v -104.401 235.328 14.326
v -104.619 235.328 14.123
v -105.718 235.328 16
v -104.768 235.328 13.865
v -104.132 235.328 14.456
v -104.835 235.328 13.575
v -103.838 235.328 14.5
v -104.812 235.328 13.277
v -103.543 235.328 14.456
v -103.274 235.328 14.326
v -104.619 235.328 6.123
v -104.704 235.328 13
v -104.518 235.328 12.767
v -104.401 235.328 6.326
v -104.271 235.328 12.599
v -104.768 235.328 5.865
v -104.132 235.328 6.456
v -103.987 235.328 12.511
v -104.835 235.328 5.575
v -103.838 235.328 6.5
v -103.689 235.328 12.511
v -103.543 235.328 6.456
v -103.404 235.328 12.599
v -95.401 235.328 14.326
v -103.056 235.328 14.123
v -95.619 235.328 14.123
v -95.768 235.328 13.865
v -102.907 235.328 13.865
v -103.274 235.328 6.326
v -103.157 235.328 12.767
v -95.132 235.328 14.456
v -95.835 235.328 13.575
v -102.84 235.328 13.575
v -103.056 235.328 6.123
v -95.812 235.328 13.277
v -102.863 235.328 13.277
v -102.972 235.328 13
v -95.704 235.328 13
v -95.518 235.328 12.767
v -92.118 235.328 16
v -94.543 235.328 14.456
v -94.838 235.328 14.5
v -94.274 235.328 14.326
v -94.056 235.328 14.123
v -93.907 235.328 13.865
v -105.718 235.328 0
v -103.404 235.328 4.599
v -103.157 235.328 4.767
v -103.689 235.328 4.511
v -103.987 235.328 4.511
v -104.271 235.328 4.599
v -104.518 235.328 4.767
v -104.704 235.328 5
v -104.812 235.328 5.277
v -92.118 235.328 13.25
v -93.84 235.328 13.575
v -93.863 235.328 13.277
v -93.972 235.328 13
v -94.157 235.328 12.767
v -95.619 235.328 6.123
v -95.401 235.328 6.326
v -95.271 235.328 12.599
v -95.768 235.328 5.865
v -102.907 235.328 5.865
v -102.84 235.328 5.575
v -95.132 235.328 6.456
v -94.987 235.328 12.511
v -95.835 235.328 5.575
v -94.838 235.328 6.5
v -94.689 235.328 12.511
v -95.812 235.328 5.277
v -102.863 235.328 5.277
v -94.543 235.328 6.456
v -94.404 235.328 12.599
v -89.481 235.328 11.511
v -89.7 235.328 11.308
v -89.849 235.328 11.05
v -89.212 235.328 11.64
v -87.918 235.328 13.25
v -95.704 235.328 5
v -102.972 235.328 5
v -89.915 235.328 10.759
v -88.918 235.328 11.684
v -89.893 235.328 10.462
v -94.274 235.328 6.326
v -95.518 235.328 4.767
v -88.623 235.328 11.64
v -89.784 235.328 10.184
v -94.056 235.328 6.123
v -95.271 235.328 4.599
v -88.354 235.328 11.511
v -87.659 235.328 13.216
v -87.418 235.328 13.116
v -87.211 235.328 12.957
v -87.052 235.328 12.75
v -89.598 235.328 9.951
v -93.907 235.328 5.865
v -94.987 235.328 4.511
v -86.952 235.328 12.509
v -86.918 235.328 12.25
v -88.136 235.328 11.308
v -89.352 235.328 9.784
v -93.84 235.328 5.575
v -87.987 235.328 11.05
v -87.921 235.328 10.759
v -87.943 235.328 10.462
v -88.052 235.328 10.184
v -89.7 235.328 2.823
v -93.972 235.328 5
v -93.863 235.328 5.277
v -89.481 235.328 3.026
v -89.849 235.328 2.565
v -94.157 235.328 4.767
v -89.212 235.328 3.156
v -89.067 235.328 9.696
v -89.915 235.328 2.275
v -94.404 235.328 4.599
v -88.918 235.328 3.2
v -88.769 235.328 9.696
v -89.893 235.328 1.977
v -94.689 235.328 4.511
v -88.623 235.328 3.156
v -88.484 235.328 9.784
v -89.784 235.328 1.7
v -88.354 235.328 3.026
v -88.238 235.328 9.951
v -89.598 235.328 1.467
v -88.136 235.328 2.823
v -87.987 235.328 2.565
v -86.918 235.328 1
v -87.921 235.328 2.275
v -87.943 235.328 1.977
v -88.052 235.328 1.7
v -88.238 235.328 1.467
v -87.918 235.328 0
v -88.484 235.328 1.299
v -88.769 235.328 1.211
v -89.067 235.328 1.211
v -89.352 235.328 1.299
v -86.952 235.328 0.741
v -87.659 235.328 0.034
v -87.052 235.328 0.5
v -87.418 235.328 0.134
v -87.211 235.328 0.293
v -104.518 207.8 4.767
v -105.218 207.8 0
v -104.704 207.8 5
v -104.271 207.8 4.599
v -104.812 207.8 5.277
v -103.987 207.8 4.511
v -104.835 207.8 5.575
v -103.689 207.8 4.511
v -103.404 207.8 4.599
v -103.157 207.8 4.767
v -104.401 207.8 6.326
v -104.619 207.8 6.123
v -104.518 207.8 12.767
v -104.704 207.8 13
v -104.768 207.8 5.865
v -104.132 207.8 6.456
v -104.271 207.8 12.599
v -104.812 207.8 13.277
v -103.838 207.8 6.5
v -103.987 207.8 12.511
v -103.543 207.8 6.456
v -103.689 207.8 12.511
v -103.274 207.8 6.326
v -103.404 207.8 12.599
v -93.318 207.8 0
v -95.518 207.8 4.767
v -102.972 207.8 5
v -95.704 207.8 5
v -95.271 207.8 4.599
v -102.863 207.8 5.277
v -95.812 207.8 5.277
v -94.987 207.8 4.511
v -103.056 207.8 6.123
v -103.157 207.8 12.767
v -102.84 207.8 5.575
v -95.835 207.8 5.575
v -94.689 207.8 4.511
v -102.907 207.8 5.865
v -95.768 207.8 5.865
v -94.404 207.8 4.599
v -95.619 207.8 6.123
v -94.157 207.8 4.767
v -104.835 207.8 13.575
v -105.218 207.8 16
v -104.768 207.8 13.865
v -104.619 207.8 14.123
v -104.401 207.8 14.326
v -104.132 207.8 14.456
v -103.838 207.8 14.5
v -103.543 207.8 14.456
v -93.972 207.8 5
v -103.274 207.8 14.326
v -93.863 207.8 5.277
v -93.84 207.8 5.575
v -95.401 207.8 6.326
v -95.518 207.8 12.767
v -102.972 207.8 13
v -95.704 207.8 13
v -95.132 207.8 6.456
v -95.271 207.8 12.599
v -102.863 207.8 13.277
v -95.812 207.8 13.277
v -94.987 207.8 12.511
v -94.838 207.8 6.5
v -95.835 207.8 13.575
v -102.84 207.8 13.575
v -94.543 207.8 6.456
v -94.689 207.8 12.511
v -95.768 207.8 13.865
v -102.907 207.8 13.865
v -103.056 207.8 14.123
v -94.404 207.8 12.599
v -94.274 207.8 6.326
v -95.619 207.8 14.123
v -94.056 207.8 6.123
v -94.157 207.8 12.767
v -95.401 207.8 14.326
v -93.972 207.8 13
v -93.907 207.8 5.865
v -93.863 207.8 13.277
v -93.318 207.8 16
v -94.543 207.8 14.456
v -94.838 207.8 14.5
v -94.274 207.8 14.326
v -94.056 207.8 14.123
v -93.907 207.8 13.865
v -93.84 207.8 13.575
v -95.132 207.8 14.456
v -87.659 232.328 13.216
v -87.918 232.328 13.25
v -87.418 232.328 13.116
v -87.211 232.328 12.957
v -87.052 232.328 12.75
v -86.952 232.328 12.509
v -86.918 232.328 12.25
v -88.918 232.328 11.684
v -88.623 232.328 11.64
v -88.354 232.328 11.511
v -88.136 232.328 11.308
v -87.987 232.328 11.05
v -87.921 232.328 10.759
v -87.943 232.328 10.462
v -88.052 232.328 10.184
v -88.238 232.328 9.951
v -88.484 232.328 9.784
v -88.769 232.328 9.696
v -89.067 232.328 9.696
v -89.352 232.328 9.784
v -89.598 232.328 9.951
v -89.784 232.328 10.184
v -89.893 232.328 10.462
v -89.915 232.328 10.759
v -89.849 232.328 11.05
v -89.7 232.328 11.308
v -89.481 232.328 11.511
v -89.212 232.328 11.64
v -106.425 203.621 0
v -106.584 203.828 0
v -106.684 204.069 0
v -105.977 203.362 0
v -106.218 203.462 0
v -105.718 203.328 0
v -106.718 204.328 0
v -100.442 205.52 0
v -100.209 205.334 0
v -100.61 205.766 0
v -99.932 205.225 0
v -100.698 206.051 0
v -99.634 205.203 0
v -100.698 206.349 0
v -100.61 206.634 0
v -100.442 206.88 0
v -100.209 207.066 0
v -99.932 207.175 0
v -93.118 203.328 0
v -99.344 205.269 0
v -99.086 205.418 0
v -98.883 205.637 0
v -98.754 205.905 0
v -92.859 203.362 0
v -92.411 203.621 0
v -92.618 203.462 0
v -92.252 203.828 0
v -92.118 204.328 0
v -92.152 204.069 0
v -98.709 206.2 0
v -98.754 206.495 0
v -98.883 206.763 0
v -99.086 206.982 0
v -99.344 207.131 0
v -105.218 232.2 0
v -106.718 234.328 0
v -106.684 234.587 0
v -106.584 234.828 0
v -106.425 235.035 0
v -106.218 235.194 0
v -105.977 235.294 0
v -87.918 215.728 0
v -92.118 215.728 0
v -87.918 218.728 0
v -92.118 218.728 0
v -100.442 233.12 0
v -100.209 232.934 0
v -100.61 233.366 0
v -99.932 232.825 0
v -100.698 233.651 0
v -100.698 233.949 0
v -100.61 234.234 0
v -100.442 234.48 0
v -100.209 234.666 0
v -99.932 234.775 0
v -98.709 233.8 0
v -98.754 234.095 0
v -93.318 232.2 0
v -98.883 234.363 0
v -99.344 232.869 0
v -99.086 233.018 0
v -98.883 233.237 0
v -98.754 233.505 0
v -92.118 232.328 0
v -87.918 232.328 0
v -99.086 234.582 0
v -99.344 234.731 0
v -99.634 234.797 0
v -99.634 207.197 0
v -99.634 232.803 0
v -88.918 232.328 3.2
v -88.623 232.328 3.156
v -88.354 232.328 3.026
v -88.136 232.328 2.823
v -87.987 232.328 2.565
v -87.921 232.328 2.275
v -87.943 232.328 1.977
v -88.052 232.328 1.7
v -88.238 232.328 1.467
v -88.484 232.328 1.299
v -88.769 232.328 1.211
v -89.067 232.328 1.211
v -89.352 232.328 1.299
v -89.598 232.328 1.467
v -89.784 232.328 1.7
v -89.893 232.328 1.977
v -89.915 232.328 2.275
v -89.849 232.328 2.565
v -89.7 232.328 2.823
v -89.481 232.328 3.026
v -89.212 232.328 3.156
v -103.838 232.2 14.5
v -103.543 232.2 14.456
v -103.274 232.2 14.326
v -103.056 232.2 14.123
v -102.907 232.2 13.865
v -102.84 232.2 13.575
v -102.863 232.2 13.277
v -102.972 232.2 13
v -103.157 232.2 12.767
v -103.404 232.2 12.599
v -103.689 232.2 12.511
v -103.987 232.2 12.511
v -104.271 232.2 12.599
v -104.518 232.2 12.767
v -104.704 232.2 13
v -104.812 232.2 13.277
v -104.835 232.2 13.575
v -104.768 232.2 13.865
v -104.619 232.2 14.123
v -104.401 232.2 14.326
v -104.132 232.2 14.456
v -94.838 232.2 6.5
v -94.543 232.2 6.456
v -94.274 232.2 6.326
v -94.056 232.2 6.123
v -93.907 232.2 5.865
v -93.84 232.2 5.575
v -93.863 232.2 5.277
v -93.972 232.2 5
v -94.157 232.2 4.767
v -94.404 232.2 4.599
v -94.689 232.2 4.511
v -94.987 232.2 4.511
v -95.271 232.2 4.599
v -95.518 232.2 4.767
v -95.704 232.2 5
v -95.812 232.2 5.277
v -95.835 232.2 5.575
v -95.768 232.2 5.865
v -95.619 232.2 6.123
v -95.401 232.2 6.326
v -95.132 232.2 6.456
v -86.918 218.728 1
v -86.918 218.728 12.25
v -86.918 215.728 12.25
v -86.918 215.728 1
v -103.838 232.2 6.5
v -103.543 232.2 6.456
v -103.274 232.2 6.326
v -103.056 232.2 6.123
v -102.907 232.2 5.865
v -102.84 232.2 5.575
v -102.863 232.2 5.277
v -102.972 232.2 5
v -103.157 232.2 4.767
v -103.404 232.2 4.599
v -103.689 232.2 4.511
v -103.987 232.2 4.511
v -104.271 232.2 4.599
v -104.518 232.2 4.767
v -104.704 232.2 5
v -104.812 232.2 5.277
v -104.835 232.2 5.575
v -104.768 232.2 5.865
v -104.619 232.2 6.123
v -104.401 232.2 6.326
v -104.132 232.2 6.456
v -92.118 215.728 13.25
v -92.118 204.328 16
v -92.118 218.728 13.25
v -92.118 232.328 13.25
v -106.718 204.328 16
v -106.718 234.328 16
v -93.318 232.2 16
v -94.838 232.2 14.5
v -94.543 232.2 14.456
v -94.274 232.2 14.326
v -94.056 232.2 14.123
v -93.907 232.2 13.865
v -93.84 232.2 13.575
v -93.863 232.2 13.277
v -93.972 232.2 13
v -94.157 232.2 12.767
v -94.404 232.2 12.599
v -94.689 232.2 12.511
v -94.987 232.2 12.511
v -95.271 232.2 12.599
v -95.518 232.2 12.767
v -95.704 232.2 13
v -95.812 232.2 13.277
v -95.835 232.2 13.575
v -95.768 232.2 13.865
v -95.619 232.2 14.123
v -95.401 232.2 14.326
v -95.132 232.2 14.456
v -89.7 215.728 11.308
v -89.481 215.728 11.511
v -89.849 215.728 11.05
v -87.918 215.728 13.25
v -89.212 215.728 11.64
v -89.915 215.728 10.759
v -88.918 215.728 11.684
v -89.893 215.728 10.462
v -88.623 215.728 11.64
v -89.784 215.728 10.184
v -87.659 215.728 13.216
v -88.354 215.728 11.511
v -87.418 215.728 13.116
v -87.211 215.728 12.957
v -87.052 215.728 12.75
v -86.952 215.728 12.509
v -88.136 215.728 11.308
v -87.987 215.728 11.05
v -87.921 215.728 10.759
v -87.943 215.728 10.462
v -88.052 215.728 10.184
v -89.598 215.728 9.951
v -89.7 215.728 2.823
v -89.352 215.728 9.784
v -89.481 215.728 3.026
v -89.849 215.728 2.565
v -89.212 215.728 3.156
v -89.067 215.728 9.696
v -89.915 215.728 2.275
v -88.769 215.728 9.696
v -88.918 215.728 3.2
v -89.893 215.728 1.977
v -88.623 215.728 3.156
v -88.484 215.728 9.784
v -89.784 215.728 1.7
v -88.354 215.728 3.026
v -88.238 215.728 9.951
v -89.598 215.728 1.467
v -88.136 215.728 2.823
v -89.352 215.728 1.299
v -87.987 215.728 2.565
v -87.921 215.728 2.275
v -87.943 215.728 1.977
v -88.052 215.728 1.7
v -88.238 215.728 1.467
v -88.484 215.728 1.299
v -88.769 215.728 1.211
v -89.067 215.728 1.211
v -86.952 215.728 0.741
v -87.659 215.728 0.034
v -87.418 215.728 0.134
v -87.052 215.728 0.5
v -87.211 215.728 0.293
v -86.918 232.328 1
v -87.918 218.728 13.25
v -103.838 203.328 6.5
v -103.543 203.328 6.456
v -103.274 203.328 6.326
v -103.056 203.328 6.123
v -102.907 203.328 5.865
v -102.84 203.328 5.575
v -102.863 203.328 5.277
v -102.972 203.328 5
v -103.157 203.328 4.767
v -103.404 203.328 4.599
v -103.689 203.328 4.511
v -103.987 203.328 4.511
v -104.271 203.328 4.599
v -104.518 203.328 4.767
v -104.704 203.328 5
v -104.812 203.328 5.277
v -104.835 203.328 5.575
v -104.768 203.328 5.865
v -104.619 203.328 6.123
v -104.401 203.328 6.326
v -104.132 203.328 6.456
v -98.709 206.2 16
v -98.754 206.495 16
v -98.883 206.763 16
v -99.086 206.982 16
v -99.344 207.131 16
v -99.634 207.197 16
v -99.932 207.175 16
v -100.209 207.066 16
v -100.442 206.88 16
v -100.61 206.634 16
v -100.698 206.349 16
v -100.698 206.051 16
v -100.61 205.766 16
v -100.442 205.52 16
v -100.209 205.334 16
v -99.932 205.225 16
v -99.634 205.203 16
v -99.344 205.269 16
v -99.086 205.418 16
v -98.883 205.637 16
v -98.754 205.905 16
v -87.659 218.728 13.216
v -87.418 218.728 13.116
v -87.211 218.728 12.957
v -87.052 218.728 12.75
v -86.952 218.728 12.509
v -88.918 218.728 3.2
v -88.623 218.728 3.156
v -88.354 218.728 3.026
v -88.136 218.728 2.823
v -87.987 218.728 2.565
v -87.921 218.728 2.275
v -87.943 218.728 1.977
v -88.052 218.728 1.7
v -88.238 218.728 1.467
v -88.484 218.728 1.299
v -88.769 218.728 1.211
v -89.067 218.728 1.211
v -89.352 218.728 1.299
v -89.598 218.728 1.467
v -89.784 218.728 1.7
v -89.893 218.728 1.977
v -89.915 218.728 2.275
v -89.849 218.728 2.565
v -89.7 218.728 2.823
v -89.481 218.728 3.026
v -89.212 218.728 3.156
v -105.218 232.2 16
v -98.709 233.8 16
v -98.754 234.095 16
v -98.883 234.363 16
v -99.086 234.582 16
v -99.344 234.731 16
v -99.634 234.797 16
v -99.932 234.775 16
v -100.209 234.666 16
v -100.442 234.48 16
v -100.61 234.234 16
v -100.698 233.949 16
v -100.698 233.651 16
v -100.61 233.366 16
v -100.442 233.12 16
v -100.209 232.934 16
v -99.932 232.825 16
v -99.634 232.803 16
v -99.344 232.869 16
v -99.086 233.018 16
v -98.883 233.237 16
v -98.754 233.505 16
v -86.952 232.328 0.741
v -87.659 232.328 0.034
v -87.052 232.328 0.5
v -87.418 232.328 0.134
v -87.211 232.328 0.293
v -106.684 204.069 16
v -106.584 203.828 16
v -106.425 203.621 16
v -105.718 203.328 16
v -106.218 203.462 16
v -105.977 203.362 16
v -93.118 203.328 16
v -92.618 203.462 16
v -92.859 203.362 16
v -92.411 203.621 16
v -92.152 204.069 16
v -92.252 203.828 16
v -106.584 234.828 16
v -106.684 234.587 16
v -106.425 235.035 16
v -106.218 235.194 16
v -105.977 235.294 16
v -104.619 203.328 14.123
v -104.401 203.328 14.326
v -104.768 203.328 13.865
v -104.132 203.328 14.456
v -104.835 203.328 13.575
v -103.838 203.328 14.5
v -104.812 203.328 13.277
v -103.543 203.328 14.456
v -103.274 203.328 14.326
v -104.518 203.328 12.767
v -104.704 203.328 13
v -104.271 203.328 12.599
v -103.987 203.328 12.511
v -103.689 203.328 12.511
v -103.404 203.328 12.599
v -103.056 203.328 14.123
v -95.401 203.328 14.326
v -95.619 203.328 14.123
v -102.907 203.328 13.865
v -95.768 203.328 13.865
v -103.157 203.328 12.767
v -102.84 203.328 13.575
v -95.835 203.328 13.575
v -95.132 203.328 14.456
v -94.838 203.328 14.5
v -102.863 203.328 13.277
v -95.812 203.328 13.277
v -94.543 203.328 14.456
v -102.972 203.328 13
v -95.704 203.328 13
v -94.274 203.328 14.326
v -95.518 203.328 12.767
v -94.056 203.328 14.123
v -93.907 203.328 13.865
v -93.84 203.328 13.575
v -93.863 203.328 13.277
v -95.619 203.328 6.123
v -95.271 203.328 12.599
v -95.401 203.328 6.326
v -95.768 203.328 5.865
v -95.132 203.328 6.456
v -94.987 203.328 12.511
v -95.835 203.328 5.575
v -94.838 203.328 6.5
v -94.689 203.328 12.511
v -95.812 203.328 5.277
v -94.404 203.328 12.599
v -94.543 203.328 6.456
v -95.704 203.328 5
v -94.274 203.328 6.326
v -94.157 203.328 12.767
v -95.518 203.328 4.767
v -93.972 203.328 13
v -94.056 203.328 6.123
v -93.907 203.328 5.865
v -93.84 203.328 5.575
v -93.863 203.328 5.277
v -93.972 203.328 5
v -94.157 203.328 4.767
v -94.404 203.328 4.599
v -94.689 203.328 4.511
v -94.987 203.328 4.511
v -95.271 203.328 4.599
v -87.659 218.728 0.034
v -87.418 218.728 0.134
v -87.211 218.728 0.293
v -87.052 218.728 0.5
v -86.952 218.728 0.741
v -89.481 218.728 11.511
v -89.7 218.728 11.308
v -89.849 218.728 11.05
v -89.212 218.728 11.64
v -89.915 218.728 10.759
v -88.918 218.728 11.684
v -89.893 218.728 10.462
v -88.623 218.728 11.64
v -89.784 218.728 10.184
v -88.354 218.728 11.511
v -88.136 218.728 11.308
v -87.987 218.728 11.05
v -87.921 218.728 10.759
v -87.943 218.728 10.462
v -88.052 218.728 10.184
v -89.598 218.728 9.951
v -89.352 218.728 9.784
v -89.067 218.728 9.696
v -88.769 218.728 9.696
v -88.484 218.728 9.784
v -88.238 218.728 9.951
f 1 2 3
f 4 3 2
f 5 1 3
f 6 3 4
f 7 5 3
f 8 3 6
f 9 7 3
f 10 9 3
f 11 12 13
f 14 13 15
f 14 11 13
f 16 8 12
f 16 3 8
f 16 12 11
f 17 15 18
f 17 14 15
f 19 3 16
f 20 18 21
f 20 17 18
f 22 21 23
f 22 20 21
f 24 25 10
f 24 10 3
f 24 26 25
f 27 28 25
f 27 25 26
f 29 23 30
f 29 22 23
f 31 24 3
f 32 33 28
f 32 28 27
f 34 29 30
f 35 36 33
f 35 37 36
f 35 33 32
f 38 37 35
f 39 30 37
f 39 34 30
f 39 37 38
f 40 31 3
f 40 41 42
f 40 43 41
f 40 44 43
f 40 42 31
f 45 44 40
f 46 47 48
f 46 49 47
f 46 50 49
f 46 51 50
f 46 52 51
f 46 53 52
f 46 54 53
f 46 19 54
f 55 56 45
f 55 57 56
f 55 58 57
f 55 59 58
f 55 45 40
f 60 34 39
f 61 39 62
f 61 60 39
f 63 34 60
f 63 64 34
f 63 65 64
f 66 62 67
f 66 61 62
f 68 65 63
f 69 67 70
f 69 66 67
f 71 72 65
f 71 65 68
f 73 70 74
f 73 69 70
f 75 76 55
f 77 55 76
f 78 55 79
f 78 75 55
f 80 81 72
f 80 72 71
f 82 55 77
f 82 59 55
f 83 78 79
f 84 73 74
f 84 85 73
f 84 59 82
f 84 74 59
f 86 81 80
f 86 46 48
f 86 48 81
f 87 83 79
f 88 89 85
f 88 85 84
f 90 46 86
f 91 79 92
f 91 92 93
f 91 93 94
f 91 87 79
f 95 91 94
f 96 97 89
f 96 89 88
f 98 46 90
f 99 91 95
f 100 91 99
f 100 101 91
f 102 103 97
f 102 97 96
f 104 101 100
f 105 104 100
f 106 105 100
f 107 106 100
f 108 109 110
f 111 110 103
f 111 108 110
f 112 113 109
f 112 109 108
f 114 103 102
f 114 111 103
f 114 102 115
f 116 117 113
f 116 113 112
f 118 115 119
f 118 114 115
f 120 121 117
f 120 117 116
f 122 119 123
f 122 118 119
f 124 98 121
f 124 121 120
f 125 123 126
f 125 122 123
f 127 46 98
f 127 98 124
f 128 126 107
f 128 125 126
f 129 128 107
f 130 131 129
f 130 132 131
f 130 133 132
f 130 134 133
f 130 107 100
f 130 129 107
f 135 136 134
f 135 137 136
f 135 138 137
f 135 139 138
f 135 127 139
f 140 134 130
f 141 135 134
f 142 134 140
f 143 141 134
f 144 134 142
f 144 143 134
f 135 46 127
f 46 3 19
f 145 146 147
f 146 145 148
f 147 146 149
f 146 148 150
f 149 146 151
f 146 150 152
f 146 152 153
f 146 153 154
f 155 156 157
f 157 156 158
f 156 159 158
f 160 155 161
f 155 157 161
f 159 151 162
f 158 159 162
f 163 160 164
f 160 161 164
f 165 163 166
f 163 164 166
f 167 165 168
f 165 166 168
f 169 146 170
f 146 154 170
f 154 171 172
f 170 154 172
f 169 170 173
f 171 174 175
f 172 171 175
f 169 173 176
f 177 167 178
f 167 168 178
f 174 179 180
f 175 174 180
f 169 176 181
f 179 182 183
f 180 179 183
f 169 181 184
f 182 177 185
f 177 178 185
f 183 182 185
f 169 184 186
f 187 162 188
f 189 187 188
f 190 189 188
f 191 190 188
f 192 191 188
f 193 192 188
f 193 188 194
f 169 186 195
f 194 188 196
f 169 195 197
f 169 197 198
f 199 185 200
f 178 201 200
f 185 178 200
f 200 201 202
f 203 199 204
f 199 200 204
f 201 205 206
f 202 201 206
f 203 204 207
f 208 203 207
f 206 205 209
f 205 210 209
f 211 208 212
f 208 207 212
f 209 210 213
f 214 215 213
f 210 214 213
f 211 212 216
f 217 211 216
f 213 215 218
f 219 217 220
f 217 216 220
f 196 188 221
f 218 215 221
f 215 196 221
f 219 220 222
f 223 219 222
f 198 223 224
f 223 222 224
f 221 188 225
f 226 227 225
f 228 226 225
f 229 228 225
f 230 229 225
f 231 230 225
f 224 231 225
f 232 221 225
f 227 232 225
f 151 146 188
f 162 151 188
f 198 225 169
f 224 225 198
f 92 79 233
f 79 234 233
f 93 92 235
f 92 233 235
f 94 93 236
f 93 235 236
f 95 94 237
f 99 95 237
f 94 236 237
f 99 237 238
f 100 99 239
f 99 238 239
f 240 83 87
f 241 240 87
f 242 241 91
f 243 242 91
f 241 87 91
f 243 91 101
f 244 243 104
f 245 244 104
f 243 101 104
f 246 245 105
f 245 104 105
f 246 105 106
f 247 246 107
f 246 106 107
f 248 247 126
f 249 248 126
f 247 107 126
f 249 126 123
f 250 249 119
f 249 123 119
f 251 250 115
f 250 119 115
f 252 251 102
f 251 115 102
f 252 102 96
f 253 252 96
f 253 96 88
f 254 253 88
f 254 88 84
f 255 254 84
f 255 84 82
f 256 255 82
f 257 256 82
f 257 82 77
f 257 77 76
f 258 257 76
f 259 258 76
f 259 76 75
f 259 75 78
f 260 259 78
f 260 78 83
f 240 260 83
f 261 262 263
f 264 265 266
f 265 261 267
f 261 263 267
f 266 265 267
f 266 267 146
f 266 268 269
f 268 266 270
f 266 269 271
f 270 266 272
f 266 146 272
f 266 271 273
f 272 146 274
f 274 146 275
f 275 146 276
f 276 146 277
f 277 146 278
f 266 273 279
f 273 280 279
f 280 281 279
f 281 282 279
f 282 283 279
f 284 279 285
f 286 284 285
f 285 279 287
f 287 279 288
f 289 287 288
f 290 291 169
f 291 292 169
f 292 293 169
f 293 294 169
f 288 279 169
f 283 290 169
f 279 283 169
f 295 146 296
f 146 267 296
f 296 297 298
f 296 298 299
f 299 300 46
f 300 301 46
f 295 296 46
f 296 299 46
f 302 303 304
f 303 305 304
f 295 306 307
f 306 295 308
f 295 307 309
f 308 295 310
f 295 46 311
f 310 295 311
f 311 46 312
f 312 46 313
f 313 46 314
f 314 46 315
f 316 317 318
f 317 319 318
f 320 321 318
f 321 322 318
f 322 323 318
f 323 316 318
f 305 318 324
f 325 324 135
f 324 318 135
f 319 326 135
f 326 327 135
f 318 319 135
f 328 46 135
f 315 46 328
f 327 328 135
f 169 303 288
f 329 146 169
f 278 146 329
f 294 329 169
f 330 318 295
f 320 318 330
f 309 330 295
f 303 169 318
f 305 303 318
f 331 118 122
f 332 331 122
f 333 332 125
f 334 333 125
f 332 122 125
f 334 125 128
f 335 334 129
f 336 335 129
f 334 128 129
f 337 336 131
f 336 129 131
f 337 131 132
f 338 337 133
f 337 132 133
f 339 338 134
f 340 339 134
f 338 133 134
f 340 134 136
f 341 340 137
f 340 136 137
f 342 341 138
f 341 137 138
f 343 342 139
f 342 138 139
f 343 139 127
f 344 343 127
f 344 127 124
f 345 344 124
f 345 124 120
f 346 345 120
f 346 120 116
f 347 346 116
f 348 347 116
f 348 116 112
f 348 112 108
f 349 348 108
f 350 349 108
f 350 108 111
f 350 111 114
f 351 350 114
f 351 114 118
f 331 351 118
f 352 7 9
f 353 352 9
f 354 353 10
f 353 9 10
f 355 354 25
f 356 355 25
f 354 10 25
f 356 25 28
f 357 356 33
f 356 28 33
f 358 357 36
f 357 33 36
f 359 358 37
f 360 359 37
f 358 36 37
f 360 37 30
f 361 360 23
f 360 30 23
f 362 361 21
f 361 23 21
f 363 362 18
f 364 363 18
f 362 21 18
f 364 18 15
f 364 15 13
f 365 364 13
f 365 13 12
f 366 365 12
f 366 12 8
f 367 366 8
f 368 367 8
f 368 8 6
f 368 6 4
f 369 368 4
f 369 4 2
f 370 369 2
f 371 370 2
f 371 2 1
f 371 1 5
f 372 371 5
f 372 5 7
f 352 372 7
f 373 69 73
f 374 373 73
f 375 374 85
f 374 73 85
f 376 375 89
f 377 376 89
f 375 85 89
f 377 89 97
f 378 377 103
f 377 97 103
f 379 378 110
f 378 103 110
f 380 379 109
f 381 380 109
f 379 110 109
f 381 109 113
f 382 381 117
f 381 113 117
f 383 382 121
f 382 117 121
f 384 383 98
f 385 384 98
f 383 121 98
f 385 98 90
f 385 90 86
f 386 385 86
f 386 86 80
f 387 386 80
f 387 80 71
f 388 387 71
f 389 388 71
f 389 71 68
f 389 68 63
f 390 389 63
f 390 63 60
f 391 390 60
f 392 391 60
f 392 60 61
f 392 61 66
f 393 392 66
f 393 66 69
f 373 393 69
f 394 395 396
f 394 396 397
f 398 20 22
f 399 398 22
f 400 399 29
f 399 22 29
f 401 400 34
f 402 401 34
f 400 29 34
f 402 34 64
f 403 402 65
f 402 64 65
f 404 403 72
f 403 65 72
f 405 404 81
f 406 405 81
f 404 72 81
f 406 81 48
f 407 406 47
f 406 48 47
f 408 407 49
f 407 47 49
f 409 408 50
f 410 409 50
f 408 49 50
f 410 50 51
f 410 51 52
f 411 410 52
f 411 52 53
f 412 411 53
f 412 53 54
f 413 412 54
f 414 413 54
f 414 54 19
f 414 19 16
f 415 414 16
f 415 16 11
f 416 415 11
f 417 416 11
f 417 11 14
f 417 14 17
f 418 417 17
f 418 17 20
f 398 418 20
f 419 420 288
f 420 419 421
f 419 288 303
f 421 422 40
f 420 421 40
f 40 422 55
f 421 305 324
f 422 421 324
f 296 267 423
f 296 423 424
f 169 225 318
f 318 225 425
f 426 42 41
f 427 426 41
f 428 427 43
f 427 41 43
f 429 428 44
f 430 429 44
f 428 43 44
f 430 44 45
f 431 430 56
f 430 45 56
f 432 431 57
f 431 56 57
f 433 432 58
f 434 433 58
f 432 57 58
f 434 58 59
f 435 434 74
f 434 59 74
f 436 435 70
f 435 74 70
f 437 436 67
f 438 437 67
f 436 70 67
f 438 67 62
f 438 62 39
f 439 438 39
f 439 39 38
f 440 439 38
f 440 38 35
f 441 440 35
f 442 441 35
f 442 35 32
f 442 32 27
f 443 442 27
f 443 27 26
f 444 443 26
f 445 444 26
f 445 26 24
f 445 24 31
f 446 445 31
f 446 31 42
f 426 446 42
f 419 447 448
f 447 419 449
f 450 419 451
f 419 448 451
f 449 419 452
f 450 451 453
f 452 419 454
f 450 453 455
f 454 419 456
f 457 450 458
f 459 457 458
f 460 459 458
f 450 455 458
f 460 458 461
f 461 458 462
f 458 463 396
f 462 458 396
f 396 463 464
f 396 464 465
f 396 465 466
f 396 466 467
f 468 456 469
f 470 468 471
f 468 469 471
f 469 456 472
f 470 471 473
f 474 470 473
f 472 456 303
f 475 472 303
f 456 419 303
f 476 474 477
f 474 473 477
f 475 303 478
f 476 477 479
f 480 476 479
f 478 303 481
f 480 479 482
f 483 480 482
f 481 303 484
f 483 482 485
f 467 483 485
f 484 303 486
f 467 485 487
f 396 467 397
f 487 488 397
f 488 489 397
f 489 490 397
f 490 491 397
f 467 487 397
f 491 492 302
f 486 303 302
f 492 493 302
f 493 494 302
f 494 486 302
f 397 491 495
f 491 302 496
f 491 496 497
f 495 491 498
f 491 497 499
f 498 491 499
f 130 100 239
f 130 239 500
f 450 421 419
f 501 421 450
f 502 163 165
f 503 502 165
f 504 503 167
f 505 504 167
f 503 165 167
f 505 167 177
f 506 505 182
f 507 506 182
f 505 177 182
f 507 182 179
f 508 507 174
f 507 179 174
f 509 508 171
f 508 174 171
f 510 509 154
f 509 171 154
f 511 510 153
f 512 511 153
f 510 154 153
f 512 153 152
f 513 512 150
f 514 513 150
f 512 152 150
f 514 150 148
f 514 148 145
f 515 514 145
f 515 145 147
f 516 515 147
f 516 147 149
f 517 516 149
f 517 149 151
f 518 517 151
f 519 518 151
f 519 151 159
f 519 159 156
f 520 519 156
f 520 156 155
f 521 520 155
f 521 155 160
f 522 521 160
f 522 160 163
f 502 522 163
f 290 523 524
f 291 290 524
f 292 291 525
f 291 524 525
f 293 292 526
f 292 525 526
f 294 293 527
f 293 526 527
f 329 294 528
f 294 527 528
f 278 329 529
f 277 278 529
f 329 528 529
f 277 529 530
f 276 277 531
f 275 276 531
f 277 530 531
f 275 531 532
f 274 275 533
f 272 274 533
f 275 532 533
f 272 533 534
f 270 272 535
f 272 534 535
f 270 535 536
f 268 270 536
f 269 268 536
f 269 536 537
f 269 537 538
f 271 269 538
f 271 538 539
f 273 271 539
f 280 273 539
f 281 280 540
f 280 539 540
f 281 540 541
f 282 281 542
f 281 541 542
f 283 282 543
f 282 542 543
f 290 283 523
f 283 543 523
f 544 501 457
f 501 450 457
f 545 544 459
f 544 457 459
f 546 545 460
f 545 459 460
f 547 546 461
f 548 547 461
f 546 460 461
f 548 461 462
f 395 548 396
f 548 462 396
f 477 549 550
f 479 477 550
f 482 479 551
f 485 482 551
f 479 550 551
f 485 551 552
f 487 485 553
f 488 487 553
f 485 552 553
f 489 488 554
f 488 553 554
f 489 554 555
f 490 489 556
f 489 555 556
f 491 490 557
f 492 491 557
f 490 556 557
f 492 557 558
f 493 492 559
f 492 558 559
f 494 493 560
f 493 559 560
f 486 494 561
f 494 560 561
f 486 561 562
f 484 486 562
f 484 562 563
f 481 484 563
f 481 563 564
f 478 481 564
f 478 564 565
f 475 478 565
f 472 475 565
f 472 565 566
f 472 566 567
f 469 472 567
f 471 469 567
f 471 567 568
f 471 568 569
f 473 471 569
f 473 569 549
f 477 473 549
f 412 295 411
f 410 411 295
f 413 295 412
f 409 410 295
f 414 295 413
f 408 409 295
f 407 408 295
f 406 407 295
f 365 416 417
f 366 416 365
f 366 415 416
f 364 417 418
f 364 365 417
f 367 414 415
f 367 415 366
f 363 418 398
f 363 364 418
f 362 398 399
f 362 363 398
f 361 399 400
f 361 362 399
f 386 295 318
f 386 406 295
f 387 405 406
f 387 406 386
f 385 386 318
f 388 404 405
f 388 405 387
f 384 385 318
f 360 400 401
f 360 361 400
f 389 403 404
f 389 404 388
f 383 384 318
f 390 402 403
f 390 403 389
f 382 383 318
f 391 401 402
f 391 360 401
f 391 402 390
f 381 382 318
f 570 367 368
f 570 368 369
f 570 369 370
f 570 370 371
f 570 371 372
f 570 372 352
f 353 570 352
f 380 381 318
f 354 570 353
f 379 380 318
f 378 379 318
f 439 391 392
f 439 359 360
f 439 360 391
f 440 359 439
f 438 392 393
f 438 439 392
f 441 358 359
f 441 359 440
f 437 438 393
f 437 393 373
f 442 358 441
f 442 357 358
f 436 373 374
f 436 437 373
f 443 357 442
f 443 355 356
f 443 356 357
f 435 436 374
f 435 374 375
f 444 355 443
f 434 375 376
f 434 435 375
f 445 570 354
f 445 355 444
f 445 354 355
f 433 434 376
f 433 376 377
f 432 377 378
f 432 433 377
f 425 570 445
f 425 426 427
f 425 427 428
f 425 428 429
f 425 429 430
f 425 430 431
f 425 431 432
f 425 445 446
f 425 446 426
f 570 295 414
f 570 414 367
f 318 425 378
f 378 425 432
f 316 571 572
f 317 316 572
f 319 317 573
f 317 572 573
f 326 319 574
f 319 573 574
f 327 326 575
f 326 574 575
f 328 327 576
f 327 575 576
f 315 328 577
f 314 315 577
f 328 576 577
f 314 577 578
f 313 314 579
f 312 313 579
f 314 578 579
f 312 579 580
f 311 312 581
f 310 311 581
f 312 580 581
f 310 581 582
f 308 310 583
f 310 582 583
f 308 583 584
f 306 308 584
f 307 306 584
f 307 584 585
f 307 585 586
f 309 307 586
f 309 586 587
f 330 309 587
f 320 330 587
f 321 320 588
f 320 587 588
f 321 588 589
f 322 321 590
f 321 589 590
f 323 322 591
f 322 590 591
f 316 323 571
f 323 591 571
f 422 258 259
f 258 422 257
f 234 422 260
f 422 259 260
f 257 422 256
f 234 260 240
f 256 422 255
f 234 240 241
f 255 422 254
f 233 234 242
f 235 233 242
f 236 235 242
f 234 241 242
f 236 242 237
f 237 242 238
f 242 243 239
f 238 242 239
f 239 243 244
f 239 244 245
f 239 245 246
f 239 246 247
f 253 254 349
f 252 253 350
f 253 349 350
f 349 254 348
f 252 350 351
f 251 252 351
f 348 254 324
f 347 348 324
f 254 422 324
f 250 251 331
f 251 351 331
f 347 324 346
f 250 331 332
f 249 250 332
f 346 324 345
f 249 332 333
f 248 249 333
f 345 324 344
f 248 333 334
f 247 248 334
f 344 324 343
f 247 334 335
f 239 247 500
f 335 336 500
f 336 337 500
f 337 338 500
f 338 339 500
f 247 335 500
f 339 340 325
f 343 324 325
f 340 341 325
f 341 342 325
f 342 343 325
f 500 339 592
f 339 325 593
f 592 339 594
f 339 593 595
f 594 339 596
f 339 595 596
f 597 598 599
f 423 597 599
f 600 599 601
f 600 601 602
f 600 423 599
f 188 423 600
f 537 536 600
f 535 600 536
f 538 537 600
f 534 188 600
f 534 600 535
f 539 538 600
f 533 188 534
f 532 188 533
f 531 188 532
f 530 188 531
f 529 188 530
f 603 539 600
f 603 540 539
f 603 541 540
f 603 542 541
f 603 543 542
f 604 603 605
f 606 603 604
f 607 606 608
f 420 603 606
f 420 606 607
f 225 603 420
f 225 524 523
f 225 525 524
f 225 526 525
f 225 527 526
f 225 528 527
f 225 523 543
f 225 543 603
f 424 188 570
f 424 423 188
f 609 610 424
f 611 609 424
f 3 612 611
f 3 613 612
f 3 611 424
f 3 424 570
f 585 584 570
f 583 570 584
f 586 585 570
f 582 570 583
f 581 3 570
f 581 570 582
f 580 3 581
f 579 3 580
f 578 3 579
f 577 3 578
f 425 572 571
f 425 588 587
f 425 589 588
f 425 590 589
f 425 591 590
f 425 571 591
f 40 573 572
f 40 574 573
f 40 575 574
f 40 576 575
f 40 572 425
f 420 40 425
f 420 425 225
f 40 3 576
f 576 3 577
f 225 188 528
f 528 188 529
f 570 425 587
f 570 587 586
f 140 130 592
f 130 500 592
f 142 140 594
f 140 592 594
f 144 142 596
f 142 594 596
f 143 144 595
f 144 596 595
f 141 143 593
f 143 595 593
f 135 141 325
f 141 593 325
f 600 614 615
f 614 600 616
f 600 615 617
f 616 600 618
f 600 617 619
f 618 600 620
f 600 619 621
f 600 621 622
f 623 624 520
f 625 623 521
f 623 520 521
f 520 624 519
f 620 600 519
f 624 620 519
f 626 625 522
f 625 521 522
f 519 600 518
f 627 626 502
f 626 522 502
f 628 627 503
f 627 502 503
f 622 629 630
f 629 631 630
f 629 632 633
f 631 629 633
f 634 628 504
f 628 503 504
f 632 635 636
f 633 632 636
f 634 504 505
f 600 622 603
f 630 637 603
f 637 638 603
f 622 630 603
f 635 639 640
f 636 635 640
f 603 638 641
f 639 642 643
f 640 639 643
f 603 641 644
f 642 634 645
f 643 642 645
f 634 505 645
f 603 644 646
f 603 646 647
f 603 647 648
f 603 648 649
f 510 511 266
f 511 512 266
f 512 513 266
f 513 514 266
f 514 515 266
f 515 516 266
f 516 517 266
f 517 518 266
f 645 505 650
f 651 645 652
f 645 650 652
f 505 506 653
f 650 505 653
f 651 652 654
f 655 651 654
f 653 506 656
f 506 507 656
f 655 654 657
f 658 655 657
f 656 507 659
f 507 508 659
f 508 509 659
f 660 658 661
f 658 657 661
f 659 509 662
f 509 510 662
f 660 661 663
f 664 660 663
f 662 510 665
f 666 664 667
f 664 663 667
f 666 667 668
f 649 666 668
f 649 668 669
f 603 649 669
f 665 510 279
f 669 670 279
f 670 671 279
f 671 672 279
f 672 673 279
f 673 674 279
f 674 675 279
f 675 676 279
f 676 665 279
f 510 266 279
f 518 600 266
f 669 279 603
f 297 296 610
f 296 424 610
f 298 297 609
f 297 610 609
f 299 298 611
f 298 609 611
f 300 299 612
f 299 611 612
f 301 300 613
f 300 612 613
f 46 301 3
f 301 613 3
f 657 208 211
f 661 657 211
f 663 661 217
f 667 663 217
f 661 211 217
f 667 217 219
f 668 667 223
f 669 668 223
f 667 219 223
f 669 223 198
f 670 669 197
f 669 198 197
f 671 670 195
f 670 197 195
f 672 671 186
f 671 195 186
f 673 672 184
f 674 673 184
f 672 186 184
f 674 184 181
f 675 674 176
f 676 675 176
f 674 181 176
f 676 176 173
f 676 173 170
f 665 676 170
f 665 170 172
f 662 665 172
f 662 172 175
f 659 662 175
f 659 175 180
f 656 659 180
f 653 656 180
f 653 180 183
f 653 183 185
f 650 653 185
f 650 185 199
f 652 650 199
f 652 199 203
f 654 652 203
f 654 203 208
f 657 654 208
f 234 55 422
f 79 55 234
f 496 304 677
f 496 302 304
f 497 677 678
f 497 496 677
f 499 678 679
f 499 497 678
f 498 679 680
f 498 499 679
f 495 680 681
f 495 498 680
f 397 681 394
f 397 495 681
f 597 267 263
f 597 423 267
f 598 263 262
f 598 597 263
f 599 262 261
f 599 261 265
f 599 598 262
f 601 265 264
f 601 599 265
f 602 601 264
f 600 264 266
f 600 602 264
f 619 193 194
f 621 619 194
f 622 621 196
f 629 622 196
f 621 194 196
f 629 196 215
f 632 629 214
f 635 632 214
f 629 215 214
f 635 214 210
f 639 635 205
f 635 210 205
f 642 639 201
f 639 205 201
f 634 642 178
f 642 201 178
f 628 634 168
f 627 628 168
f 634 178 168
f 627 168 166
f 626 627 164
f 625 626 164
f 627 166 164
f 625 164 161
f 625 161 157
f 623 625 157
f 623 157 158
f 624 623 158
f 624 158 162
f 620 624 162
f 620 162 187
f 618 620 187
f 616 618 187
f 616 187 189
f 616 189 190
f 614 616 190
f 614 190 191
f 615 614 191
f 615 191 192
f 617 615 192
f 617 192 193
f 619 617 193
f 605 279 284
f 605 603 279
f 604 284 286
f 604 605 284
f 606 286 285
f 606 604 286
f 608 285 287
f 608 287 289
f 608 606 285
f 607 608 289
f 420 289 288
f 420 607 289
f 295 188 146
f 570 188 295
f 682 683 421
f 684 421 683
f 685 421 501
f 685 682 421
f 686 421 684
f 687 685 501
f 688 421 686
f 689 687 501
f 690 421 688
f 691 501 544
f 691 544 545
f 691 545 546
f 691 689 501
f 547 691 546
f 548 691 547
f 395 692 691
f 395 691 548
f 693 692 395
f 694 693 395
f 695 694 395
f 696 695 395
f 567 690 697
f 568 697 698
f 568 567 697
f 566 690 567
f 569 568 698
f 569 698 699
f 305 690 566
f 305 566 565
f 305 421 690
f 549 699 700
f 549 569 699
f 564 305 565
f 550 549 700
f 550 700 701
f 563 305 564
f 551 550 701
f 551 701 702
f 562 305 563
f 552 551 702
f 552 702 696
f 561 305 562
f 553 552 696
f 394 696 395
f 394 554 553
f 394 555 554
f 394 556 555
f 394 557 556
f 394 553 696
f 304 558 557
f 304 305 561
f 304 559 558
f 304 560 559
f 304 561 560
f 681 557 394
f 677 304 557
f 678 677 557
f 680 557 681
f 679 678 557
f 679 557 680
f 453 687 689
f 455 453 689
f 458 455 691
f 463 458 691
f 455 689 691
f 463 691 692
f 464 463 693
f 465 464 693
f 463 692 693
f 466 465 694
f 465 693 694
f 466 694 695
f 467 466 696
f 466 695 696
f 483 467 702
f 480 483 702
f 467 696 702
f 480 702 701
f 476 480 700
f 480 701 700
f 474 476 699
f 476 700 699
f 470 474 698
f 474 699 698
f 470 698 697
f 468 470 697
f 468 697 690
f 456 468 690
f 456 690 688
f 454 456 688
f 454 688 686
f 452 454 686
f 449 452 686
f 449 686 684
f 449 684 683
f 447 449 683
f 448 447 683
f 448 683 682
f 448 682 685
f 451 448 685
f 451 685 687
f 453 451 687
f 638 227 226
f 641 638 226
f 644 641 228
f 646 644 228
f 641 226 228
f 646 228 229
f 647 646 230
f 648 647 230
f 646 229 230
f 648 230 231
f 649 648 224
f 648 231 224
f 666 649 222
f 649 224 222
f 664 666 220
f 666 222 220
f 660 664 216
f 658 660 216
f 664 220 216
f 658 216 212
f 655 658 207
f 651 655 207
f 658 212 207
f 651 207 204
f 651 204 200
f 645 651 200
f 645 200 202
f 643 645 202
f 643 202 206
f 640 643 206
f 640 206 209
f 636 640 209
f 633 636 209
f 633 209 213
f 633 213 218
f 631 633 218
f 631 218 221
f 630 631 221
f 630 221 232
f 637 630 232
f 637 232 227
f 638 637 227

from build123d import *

# Parameters (mm, degrees)
SKETCH2_W           = 14.6
SKETCH2_H           = 32
BOSS_EXTRUDE1_DEPTH = 16
FILLET1_R           = 1
SKETCH3_W           = 11.9
SKETCH3_H           = 24.4
CUT_EXTRUDE1_DEPTH  = 16
SKETCH4_R           = 1
CUT_EXTRUDE2_DEPTH  = 16
SKETCH5_R           = 1
CUT_EXTRUDE3_DEPTH  = 113.555199241
SKETCH6_W           = 5.2
SKETCH6_H           = 13.25
BOSS_EXTRUDE2_DEPTH = 3
SKETCH7_W           = 5.2
SKETCH7_H           = 13.25
BOSS_EXTRUDE3_DEPTH = 3
SKETCH8_R           = 1
CUT_EXTRUDE4_DEPTH  = 33
FILLET2_R           = 1


with BuildPart() as part:
    # Sketch2 → Boss-Extrude1 (new body)
    with BuildSketch(Plane.XY):
        with Locations((-99.41772522, 219.327818509)):
            Rectangle(SKETCH2_W, SKETCH2_H)
    extrude(amount=BOSS_EXTRUDE1_DEPTH)

    # Fillet1
    fillet1_edges = [part.edges().sort_by_distance(p)[0] for p in [
        (-106.71772522, 235.327818509, 8),
        (-92.11772522, 203.327818509, 8),
        (-106.71772522, 203.327818509, 8),
    ]]
    fillet(fillet1_edges, radius=FILLET1_R)

    # Sketch3 → Cut-Extrude1 (cut)
    with BuildSketch(Plane.XY.offset(16)):
        with Locations((-99.26772522, 219.999996948)):
            Rectangle(SKETCH3_W, SKETCH3_H)
    extrude(amount=-CUT_EXTRUDE1_DEPTH, mode=Mode.SUBTRACT)

    # Sketch4 → Cut-Extrude2 (cut)
    with BuildSketch(Plane.XY.offset(16)):
        with Locations((-99.709122305, 233.799996948)):
            Circle(SKETCH4_R)
        with Locations((-99.709122305, 206.199996948)):
            Circle(SKETCH4_R)
    extrude(amount=-CUT_EXTRUDE2_DEPTH, mode=Mode.SUBTRACT)

    # Sketch5 → Cut-Extrude3 (cut, through all)
    with BuildSketch(Plane(origin=(0, 235.327818509, 0), x_dir=(1, 0, 0), z_dir=(0, 1, 0))):
        with Locations(Location((-103.837557169, -5.5, 0), (0, 0, 270))):
            Circle(SKETCH5_R)
        with Locations(Location((-94.837557169, -5.5, 0), (0, 0, 270))):
            Circle(SKETCH5_R)
        with Locations(Location((-94.837557169, -13.5, 0), (0, 0, 270))):
            Circle(SKETCH5_R)
        with Locations(Location((-103.837557169, -13.5, 0), (0, 0, 270))):
            Circle(SKETCH5_R)
    extrude(amount=-CUT_EXTRUDE3_DEPTH, mode=Mode.SUBTRACT)

    # Sketch6 → Boss-Extrude2 (add)
    with BuildSketch(Plane(origin=(0, 235.327818509, 0), x_dir=(1, 0, 0), z_dir=(0, 1, 0))):
        with Locations((-89.51772522, -6.625)):
            Rectangle(SKETCH6_W, SKETCH6_H)
    extrude(amount=-BOSS_EXTRUDE2_DEPTH)

    # Sketch7 → Boss-Extrude3 (add)
    with BuildSketch(Plane(origin=(0, 218.727818509, 0), x_dir=(1, 0, 0), z_dir=(0, 1, 0))):
        with Locations((-89.51772522, -6.625)):
            Rectangle(SKETCH7_W, SKETCH7_H)
    extrude(amount=-BOSS_EXTRUDE3_DEPTH)

    # Sketch8 → Cut-Extrude4 (cut)
    with BuildSketch(Plane(origin=(0, 235.327818509, 0), x_dir=(1, 0, 0), z_dir=(0, 1, 0))):
        with Locations(Location((-88.91772522, -2.2, 0), (0, 0, 270))):
            Circle(SKETCH8_R)
        with Locations(Location((-88.91772522, -10.684490828, 0), (0, 0, 270))):
            Circle(SKETCH8_R)
    extrude(amount=-CUT_EXTRUDE4_DEPTH, mode=Mode.SUBTRACT)

    # Fillet2
    fillet2_edges = [part.edges().sort_by_distance(p)[0] for p in [
        (-86.91772522, 217.227818509, 0),
        (-86.91772522, 217.227818509, 13.25),
        (-86.91772522, 233.827818509, 0),
        (-86.91772522, 233.827818509, 13.25),
    ]]
    fillet(fillet2_edges, radius=FILLET2_R)


solid = part.part
